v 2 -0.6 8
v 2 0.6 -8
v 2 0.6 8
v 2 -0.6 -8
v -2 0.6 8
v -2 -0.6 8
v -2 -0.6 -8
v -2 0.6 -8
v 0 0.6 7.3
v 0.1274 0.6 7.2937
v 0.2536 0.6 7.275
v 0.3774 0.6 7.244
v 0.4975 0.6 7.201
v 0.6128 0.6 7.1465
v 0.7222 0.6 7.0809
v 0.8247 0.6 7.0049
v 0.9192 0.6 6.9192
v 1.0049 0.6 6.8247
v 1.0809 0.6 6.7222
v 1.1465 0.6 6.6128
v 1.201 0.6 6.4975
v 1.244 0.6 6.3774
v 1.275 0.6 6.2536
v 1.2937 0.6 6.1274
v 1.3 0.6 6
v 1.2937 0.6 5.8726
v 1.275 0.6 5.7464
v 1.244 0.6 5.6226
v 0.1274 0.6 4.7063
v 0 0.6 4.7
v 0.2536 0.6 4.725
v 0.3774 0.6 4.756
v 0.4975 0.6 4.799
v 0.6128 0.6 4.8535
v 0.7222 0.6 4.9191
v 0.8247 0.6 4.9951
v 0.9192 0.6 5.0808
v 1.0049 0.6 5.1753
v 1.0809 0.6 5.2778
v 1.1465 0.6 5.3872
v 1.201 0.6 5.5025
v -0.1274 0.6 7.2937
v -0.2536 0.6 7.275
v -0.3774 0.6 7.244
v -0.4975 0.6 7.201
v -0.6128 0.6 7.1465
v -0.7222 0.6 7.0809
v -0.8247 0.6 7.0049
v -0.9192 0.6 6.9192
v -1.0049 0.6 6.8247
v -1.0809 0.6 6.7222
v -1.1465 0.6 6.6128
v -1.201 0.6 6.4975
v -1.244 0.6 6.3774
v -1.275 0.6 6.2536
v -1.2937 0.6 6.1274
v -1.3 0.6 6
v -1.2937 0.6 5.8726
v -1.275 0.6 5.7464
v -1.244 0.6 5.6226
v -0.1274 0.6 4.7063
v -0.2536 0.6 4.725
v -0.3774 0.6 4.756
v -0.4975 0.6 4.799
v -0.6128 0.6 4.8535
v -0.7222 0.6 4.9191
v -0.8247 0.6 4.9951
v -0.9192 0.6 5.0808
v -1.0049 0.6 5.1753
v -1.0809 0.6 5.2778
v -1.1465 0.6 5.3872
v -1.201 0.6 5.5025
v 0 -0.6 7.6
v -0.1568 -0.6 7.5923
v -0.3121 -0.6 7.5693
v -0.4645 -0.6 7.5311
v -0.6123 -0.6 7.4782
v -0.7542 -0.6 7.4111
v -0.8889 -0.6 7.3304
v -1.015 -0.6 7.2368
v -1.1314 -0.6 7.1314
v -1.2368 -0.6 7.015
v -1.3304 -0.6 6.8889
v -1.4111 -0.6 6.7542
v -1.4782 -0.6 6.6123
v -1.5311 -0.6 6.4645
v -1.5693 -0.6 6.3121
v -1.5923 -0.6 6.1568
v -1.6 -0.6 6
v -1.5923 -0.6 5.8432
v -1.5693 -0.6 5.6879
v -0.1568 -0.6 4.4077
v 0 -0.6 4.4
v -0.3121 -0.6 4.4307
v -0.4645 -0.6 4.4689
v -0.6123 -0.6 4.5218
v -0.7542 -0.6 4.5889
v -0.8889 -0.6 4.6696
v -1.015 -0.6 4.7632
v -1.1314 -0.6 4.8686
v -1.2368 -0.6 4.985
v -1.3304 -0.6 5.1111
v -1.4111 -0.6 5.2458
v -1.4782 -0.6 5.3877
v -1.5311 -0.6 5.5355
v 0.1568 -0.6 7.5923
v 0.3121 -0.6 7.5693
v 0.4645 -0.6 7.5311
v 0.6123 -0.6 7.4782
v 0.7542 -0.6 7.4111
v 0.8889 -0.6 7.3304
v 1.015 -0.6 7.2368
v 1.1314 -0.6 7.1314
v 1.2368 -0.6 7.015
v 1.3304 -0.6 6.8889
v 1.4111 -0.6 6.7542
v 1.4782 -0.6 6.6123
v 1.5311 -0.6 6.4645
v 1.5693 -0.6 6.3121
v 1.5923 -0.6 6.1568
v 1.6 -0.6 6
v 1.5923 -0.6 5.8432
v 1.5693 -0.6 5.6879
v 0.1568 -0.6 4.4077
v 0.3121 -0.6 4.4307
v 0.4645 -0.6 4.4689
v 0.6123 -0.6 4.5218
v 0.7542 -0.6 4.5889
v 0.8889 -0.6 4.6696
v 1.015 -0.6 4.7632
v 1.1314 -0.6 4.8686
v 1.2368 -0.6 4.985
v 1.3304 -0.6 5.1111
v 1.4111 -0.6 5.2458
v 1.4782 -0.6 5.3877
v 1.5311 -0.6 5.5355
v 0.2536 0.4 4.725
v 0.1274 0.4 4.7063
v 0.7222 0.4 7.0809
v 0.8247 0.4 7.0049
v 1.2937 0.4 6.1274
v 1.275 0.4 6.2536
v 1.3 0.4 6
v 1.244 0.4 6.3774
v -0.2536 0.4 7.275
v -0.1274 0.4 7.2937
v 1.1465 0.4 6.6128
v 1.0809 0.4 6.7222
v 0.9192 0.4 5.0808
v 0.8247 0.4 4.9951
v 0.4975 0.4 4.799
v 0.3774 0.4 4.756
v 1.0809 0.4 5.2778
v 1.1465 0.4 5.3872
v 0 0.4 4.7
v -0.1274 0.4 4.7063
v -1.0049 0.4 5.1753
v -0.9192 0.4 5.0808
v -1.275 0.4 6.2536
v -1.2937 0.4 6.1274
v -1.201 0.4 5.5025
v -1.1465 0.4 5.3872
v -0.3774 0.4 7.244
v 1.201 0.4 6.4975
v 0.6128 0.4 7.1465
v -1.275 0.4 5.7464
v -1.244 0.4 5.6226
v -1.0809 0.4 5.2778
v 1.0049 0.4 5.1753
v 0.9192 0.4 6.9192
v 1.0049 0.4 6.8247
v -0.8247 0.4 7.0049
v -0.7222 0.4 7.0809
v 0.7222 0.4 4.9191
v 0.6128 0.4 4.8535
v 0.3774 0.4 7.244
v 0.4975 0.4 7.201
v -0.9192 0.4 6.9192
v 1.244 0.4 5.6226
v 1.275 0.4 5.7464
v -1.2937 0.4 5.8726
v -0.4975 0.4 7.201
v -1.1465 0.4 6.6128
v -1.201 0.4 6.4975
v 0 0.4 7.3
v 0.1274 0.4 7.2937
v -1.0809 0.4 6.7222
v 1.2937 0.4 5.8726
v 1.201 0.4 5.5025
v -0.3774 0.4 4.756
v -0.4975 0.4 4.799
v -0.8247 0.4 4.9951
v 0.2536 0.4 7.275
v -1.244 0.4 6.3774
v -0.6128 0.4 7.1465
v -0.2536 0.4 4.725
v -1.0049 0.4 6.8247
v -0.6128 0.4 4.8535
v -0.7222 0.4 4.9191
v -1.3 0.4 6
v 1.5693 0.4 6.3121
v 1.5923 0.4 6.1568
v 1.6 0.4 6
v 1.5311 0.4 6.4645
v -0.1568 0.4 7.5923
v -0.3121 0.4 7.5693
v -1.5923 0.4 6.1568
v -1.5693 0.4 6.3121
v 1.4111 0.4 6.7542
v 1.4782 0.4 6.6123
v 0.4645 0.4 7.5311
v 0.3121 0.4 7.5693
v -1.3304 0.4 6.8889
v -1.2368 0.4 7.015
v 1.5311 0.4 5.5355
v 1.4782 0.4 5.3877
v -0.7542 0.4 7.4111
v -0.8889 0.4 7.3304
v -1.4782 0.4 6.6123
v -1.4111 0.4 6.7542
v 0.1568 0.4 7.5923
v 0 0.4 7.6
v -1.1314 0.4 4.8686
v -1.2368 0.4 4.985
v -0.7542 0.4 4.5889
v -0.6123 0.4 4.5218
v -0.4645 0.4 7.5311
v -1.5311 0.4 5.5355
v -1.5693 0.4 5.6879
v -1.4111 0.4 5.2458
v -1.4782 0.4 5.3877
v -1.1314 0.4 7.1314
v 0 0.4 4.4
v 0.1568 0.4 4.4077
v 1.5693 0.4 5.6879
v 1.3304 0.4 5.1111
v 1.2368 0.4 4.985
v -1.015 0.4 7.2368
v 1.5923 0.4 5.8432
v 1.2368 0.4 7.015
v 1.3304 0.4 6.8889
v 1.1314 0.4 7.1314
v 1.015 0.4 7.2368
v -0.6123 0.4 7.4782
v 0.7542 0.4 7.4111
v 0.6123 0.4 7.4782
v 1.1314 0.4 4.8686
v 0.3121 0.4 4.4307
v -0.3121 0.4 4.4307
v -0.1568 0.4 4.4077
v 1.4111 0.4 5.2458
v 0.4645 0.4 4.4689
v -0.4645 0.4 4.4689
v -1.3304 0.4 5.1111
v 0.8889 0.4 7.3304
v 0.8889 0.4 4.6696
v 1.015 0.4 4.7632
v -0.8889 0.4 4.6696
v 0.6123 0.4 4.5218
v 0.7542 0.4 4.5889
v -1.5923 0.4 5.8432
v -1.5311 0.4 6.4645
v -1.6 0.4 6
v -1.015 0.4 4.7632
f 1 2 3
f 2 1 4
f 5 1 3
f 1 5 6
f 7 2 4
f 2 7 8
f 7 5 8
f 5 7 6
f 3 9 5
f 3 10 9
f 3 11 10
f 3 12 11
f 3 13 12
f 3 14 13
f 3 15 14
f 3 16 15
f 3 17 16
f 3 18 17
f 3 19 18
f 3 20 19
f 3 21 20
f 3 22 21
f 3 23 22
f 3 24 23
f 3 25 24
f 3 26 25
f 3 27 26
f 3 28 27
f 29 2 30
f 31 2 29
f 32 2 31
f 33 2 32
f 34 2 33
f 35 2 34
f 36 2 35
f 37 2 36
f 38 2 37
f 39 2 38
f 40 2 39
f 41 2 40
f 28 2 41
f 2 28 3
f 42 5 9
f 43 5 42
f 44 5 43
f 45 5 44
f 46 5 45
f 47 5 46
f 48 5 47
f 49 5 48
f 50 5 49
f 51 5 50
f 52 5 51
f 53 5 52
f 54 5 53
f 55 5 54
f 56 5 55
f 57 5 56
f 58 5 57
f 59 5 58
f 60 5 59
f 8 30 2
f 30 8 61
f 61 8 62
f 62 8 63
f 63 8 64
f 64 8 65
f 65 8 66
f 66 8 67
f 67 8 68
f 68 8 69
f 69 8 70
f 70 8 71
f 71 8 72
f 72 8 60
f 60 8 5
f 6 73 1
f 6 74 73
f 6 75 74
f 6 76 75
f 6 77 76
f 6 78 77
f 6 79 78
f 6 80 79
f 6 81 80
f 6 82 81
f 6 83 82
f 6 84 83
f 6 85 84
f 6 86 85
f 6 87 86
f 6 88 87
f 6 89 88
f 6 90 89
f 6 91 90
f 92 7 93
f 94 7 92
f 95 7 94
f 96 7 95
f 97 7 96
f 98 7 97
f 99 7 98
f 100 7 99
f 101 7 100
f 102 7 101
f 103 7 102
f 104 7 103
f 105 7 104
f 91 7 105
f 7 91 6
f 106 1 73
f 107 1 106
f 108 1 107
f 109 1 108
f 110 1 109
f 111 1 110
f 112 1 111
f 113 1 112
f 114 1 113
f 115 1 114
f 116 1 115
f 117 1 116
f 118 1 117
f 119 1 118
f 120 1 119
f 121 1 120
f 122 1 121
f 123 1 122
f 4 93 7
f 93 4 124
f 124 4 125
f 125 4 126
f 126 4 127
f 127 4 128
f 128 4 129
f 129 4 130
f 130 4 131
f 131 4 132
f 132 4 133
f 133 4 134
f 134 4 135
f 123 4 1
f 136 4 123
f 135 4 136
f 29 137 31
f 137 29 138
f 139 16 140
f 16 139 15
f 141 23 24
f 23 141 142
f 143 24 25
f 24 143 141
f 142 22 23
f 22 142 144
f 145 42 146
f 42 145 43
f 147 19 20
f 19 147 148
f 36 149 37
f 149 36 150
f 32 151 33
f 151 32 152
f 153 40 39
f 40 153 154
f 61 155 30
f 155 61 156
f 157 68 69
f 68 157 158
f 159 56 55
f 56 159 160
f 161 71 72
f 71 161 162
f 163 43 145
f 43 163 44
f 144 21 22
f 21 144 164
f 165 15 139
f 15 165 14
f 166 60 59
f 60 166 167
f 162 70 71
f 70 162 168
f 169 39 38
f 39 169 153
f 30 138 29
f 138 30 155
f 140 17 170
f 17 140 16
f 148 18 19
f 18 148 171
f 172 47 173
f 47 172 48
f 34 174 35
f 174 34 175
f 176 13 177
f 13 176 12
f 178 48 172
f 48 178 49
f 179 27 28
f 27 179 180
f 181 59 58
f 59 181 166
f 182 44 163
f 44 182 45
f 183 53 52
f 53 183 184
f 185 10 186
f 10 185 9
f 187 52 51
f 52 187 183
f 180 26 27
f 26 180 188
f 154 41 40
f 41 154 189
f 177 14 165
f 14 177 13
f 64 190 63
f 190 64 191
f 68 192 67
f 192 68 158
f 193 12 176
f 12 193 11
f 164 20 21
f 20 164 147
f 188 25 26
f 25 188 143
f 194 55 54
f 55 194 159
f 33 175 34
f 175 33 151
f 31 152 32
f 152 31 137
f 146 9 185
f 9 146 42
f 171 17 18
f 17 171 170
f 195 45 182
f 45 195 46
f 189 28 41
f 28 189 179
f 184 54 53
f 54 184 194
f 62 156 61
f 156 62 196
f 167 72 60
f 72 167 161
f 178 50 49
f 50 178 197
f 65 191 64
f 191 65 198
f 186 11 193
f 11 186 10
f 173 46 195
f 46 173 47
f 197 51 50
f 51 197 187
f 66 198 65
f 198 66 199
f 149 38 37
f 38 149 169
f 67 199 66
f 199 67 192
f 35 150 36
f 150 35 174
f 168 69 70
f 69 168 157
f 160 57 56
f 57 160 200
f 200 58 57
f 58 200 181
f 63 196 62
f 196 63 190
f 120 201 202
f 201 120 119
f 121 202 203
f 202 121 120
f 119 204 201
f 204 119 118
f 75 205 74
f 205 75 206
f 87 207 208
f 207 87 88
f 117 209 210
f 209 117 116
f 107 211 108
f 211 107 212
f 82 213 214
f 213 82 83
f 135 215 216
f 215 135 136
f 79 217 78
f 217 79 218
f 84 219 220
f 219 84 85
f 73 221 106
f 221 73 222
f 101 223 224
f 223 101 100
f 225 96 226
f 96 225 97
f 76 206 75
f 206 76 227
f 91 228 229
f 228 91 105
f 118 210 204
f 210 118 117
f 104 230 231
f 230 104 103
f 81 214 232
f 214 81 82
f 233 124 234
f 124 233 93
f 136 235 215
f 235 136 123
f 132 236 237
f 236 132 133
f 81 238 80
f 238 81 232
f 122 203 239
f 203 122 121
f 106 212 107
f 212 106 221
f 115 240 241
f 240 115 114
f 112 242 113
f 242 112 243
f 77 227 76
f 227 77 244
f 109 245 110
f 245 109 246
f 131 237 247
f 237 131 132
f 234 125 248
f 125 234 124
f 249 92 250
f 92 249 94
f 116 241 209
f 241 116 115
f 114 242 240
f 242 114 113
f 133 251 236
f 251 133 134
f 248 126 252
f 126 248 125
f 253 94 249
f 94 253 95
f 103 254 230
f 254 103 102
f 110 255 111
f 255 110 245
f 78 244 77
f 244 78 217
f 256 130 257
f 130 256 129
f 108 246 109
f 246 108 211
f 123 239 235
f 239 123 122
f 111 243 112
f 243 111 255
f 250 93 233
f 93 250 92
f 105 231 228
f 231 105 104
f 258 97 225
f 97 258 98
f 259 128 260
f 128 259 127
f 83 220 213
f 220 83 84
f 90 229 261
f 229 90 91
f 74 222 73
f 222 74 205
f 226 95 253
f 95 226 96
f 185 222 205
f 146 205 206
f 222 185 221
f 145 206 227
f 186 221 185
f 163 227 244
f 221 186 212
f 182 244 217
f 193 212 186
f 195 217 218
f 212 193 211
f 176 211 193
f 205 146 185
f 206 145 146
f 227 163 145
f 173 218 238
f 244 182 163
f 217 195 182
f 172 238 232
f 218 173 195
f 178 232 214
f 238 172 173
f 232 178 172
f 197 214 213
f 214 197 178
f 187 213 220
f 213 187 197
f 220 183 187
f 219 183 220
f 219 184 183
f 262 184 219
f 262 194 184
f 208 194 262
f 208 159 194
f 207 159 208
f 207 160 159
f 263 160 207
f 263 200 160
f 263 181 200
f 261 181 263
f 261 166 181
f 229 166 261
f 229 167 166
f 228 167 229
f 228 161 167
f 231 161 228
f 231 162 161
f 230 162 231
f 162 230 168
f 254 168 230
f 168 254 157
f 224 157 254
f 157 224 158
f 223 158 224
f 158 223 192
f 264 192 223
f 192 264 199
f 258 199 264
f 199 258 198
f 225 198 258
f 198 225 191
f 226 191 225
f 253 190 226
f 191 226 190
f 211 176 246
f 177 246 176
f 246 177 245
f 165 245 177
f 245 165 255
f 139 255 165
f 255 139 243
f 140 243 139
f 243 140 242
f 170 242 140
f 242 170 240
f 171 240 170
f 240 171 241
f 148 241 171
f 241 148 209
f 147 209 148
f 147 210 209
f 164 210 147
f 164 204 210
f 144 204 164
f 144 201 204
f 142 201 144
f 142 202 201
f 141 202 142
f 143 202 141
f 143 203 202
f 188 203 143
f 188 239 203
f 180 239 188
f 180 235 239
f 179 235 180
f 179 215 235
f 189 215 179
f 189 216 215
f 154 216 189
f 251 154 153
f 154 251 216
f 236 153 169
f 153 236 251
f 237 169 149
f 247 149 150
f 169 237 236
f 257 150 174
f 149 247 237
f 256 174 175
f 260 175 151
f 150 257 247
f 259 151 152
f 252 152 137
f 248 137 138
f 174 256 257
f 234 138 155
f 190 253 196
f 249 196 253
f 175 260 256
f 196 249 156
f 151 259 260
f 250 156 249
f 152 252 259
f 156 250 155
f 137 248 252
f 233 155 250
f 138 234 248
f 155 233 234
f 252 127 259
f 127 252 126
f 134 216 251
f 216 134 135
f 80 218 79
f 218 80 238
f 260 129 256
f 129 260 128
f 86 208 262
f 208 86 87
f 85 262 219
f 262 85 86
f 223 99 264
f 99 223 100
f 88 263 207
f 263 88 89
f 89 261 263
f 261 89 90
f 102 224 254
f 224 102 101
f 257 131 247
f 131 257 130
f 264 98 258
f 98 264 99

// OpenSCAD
$fn = 64;
difference() {
  cube([4, 1.2, 16], center = true);
  translate([0, 1, 6]) rotate([90,0,0])cylinder(r=1.3, h=4);
  translate([0, 0.4, 6]) rotate([90,0,0])cylinder(r=1.6, h=4);
}
